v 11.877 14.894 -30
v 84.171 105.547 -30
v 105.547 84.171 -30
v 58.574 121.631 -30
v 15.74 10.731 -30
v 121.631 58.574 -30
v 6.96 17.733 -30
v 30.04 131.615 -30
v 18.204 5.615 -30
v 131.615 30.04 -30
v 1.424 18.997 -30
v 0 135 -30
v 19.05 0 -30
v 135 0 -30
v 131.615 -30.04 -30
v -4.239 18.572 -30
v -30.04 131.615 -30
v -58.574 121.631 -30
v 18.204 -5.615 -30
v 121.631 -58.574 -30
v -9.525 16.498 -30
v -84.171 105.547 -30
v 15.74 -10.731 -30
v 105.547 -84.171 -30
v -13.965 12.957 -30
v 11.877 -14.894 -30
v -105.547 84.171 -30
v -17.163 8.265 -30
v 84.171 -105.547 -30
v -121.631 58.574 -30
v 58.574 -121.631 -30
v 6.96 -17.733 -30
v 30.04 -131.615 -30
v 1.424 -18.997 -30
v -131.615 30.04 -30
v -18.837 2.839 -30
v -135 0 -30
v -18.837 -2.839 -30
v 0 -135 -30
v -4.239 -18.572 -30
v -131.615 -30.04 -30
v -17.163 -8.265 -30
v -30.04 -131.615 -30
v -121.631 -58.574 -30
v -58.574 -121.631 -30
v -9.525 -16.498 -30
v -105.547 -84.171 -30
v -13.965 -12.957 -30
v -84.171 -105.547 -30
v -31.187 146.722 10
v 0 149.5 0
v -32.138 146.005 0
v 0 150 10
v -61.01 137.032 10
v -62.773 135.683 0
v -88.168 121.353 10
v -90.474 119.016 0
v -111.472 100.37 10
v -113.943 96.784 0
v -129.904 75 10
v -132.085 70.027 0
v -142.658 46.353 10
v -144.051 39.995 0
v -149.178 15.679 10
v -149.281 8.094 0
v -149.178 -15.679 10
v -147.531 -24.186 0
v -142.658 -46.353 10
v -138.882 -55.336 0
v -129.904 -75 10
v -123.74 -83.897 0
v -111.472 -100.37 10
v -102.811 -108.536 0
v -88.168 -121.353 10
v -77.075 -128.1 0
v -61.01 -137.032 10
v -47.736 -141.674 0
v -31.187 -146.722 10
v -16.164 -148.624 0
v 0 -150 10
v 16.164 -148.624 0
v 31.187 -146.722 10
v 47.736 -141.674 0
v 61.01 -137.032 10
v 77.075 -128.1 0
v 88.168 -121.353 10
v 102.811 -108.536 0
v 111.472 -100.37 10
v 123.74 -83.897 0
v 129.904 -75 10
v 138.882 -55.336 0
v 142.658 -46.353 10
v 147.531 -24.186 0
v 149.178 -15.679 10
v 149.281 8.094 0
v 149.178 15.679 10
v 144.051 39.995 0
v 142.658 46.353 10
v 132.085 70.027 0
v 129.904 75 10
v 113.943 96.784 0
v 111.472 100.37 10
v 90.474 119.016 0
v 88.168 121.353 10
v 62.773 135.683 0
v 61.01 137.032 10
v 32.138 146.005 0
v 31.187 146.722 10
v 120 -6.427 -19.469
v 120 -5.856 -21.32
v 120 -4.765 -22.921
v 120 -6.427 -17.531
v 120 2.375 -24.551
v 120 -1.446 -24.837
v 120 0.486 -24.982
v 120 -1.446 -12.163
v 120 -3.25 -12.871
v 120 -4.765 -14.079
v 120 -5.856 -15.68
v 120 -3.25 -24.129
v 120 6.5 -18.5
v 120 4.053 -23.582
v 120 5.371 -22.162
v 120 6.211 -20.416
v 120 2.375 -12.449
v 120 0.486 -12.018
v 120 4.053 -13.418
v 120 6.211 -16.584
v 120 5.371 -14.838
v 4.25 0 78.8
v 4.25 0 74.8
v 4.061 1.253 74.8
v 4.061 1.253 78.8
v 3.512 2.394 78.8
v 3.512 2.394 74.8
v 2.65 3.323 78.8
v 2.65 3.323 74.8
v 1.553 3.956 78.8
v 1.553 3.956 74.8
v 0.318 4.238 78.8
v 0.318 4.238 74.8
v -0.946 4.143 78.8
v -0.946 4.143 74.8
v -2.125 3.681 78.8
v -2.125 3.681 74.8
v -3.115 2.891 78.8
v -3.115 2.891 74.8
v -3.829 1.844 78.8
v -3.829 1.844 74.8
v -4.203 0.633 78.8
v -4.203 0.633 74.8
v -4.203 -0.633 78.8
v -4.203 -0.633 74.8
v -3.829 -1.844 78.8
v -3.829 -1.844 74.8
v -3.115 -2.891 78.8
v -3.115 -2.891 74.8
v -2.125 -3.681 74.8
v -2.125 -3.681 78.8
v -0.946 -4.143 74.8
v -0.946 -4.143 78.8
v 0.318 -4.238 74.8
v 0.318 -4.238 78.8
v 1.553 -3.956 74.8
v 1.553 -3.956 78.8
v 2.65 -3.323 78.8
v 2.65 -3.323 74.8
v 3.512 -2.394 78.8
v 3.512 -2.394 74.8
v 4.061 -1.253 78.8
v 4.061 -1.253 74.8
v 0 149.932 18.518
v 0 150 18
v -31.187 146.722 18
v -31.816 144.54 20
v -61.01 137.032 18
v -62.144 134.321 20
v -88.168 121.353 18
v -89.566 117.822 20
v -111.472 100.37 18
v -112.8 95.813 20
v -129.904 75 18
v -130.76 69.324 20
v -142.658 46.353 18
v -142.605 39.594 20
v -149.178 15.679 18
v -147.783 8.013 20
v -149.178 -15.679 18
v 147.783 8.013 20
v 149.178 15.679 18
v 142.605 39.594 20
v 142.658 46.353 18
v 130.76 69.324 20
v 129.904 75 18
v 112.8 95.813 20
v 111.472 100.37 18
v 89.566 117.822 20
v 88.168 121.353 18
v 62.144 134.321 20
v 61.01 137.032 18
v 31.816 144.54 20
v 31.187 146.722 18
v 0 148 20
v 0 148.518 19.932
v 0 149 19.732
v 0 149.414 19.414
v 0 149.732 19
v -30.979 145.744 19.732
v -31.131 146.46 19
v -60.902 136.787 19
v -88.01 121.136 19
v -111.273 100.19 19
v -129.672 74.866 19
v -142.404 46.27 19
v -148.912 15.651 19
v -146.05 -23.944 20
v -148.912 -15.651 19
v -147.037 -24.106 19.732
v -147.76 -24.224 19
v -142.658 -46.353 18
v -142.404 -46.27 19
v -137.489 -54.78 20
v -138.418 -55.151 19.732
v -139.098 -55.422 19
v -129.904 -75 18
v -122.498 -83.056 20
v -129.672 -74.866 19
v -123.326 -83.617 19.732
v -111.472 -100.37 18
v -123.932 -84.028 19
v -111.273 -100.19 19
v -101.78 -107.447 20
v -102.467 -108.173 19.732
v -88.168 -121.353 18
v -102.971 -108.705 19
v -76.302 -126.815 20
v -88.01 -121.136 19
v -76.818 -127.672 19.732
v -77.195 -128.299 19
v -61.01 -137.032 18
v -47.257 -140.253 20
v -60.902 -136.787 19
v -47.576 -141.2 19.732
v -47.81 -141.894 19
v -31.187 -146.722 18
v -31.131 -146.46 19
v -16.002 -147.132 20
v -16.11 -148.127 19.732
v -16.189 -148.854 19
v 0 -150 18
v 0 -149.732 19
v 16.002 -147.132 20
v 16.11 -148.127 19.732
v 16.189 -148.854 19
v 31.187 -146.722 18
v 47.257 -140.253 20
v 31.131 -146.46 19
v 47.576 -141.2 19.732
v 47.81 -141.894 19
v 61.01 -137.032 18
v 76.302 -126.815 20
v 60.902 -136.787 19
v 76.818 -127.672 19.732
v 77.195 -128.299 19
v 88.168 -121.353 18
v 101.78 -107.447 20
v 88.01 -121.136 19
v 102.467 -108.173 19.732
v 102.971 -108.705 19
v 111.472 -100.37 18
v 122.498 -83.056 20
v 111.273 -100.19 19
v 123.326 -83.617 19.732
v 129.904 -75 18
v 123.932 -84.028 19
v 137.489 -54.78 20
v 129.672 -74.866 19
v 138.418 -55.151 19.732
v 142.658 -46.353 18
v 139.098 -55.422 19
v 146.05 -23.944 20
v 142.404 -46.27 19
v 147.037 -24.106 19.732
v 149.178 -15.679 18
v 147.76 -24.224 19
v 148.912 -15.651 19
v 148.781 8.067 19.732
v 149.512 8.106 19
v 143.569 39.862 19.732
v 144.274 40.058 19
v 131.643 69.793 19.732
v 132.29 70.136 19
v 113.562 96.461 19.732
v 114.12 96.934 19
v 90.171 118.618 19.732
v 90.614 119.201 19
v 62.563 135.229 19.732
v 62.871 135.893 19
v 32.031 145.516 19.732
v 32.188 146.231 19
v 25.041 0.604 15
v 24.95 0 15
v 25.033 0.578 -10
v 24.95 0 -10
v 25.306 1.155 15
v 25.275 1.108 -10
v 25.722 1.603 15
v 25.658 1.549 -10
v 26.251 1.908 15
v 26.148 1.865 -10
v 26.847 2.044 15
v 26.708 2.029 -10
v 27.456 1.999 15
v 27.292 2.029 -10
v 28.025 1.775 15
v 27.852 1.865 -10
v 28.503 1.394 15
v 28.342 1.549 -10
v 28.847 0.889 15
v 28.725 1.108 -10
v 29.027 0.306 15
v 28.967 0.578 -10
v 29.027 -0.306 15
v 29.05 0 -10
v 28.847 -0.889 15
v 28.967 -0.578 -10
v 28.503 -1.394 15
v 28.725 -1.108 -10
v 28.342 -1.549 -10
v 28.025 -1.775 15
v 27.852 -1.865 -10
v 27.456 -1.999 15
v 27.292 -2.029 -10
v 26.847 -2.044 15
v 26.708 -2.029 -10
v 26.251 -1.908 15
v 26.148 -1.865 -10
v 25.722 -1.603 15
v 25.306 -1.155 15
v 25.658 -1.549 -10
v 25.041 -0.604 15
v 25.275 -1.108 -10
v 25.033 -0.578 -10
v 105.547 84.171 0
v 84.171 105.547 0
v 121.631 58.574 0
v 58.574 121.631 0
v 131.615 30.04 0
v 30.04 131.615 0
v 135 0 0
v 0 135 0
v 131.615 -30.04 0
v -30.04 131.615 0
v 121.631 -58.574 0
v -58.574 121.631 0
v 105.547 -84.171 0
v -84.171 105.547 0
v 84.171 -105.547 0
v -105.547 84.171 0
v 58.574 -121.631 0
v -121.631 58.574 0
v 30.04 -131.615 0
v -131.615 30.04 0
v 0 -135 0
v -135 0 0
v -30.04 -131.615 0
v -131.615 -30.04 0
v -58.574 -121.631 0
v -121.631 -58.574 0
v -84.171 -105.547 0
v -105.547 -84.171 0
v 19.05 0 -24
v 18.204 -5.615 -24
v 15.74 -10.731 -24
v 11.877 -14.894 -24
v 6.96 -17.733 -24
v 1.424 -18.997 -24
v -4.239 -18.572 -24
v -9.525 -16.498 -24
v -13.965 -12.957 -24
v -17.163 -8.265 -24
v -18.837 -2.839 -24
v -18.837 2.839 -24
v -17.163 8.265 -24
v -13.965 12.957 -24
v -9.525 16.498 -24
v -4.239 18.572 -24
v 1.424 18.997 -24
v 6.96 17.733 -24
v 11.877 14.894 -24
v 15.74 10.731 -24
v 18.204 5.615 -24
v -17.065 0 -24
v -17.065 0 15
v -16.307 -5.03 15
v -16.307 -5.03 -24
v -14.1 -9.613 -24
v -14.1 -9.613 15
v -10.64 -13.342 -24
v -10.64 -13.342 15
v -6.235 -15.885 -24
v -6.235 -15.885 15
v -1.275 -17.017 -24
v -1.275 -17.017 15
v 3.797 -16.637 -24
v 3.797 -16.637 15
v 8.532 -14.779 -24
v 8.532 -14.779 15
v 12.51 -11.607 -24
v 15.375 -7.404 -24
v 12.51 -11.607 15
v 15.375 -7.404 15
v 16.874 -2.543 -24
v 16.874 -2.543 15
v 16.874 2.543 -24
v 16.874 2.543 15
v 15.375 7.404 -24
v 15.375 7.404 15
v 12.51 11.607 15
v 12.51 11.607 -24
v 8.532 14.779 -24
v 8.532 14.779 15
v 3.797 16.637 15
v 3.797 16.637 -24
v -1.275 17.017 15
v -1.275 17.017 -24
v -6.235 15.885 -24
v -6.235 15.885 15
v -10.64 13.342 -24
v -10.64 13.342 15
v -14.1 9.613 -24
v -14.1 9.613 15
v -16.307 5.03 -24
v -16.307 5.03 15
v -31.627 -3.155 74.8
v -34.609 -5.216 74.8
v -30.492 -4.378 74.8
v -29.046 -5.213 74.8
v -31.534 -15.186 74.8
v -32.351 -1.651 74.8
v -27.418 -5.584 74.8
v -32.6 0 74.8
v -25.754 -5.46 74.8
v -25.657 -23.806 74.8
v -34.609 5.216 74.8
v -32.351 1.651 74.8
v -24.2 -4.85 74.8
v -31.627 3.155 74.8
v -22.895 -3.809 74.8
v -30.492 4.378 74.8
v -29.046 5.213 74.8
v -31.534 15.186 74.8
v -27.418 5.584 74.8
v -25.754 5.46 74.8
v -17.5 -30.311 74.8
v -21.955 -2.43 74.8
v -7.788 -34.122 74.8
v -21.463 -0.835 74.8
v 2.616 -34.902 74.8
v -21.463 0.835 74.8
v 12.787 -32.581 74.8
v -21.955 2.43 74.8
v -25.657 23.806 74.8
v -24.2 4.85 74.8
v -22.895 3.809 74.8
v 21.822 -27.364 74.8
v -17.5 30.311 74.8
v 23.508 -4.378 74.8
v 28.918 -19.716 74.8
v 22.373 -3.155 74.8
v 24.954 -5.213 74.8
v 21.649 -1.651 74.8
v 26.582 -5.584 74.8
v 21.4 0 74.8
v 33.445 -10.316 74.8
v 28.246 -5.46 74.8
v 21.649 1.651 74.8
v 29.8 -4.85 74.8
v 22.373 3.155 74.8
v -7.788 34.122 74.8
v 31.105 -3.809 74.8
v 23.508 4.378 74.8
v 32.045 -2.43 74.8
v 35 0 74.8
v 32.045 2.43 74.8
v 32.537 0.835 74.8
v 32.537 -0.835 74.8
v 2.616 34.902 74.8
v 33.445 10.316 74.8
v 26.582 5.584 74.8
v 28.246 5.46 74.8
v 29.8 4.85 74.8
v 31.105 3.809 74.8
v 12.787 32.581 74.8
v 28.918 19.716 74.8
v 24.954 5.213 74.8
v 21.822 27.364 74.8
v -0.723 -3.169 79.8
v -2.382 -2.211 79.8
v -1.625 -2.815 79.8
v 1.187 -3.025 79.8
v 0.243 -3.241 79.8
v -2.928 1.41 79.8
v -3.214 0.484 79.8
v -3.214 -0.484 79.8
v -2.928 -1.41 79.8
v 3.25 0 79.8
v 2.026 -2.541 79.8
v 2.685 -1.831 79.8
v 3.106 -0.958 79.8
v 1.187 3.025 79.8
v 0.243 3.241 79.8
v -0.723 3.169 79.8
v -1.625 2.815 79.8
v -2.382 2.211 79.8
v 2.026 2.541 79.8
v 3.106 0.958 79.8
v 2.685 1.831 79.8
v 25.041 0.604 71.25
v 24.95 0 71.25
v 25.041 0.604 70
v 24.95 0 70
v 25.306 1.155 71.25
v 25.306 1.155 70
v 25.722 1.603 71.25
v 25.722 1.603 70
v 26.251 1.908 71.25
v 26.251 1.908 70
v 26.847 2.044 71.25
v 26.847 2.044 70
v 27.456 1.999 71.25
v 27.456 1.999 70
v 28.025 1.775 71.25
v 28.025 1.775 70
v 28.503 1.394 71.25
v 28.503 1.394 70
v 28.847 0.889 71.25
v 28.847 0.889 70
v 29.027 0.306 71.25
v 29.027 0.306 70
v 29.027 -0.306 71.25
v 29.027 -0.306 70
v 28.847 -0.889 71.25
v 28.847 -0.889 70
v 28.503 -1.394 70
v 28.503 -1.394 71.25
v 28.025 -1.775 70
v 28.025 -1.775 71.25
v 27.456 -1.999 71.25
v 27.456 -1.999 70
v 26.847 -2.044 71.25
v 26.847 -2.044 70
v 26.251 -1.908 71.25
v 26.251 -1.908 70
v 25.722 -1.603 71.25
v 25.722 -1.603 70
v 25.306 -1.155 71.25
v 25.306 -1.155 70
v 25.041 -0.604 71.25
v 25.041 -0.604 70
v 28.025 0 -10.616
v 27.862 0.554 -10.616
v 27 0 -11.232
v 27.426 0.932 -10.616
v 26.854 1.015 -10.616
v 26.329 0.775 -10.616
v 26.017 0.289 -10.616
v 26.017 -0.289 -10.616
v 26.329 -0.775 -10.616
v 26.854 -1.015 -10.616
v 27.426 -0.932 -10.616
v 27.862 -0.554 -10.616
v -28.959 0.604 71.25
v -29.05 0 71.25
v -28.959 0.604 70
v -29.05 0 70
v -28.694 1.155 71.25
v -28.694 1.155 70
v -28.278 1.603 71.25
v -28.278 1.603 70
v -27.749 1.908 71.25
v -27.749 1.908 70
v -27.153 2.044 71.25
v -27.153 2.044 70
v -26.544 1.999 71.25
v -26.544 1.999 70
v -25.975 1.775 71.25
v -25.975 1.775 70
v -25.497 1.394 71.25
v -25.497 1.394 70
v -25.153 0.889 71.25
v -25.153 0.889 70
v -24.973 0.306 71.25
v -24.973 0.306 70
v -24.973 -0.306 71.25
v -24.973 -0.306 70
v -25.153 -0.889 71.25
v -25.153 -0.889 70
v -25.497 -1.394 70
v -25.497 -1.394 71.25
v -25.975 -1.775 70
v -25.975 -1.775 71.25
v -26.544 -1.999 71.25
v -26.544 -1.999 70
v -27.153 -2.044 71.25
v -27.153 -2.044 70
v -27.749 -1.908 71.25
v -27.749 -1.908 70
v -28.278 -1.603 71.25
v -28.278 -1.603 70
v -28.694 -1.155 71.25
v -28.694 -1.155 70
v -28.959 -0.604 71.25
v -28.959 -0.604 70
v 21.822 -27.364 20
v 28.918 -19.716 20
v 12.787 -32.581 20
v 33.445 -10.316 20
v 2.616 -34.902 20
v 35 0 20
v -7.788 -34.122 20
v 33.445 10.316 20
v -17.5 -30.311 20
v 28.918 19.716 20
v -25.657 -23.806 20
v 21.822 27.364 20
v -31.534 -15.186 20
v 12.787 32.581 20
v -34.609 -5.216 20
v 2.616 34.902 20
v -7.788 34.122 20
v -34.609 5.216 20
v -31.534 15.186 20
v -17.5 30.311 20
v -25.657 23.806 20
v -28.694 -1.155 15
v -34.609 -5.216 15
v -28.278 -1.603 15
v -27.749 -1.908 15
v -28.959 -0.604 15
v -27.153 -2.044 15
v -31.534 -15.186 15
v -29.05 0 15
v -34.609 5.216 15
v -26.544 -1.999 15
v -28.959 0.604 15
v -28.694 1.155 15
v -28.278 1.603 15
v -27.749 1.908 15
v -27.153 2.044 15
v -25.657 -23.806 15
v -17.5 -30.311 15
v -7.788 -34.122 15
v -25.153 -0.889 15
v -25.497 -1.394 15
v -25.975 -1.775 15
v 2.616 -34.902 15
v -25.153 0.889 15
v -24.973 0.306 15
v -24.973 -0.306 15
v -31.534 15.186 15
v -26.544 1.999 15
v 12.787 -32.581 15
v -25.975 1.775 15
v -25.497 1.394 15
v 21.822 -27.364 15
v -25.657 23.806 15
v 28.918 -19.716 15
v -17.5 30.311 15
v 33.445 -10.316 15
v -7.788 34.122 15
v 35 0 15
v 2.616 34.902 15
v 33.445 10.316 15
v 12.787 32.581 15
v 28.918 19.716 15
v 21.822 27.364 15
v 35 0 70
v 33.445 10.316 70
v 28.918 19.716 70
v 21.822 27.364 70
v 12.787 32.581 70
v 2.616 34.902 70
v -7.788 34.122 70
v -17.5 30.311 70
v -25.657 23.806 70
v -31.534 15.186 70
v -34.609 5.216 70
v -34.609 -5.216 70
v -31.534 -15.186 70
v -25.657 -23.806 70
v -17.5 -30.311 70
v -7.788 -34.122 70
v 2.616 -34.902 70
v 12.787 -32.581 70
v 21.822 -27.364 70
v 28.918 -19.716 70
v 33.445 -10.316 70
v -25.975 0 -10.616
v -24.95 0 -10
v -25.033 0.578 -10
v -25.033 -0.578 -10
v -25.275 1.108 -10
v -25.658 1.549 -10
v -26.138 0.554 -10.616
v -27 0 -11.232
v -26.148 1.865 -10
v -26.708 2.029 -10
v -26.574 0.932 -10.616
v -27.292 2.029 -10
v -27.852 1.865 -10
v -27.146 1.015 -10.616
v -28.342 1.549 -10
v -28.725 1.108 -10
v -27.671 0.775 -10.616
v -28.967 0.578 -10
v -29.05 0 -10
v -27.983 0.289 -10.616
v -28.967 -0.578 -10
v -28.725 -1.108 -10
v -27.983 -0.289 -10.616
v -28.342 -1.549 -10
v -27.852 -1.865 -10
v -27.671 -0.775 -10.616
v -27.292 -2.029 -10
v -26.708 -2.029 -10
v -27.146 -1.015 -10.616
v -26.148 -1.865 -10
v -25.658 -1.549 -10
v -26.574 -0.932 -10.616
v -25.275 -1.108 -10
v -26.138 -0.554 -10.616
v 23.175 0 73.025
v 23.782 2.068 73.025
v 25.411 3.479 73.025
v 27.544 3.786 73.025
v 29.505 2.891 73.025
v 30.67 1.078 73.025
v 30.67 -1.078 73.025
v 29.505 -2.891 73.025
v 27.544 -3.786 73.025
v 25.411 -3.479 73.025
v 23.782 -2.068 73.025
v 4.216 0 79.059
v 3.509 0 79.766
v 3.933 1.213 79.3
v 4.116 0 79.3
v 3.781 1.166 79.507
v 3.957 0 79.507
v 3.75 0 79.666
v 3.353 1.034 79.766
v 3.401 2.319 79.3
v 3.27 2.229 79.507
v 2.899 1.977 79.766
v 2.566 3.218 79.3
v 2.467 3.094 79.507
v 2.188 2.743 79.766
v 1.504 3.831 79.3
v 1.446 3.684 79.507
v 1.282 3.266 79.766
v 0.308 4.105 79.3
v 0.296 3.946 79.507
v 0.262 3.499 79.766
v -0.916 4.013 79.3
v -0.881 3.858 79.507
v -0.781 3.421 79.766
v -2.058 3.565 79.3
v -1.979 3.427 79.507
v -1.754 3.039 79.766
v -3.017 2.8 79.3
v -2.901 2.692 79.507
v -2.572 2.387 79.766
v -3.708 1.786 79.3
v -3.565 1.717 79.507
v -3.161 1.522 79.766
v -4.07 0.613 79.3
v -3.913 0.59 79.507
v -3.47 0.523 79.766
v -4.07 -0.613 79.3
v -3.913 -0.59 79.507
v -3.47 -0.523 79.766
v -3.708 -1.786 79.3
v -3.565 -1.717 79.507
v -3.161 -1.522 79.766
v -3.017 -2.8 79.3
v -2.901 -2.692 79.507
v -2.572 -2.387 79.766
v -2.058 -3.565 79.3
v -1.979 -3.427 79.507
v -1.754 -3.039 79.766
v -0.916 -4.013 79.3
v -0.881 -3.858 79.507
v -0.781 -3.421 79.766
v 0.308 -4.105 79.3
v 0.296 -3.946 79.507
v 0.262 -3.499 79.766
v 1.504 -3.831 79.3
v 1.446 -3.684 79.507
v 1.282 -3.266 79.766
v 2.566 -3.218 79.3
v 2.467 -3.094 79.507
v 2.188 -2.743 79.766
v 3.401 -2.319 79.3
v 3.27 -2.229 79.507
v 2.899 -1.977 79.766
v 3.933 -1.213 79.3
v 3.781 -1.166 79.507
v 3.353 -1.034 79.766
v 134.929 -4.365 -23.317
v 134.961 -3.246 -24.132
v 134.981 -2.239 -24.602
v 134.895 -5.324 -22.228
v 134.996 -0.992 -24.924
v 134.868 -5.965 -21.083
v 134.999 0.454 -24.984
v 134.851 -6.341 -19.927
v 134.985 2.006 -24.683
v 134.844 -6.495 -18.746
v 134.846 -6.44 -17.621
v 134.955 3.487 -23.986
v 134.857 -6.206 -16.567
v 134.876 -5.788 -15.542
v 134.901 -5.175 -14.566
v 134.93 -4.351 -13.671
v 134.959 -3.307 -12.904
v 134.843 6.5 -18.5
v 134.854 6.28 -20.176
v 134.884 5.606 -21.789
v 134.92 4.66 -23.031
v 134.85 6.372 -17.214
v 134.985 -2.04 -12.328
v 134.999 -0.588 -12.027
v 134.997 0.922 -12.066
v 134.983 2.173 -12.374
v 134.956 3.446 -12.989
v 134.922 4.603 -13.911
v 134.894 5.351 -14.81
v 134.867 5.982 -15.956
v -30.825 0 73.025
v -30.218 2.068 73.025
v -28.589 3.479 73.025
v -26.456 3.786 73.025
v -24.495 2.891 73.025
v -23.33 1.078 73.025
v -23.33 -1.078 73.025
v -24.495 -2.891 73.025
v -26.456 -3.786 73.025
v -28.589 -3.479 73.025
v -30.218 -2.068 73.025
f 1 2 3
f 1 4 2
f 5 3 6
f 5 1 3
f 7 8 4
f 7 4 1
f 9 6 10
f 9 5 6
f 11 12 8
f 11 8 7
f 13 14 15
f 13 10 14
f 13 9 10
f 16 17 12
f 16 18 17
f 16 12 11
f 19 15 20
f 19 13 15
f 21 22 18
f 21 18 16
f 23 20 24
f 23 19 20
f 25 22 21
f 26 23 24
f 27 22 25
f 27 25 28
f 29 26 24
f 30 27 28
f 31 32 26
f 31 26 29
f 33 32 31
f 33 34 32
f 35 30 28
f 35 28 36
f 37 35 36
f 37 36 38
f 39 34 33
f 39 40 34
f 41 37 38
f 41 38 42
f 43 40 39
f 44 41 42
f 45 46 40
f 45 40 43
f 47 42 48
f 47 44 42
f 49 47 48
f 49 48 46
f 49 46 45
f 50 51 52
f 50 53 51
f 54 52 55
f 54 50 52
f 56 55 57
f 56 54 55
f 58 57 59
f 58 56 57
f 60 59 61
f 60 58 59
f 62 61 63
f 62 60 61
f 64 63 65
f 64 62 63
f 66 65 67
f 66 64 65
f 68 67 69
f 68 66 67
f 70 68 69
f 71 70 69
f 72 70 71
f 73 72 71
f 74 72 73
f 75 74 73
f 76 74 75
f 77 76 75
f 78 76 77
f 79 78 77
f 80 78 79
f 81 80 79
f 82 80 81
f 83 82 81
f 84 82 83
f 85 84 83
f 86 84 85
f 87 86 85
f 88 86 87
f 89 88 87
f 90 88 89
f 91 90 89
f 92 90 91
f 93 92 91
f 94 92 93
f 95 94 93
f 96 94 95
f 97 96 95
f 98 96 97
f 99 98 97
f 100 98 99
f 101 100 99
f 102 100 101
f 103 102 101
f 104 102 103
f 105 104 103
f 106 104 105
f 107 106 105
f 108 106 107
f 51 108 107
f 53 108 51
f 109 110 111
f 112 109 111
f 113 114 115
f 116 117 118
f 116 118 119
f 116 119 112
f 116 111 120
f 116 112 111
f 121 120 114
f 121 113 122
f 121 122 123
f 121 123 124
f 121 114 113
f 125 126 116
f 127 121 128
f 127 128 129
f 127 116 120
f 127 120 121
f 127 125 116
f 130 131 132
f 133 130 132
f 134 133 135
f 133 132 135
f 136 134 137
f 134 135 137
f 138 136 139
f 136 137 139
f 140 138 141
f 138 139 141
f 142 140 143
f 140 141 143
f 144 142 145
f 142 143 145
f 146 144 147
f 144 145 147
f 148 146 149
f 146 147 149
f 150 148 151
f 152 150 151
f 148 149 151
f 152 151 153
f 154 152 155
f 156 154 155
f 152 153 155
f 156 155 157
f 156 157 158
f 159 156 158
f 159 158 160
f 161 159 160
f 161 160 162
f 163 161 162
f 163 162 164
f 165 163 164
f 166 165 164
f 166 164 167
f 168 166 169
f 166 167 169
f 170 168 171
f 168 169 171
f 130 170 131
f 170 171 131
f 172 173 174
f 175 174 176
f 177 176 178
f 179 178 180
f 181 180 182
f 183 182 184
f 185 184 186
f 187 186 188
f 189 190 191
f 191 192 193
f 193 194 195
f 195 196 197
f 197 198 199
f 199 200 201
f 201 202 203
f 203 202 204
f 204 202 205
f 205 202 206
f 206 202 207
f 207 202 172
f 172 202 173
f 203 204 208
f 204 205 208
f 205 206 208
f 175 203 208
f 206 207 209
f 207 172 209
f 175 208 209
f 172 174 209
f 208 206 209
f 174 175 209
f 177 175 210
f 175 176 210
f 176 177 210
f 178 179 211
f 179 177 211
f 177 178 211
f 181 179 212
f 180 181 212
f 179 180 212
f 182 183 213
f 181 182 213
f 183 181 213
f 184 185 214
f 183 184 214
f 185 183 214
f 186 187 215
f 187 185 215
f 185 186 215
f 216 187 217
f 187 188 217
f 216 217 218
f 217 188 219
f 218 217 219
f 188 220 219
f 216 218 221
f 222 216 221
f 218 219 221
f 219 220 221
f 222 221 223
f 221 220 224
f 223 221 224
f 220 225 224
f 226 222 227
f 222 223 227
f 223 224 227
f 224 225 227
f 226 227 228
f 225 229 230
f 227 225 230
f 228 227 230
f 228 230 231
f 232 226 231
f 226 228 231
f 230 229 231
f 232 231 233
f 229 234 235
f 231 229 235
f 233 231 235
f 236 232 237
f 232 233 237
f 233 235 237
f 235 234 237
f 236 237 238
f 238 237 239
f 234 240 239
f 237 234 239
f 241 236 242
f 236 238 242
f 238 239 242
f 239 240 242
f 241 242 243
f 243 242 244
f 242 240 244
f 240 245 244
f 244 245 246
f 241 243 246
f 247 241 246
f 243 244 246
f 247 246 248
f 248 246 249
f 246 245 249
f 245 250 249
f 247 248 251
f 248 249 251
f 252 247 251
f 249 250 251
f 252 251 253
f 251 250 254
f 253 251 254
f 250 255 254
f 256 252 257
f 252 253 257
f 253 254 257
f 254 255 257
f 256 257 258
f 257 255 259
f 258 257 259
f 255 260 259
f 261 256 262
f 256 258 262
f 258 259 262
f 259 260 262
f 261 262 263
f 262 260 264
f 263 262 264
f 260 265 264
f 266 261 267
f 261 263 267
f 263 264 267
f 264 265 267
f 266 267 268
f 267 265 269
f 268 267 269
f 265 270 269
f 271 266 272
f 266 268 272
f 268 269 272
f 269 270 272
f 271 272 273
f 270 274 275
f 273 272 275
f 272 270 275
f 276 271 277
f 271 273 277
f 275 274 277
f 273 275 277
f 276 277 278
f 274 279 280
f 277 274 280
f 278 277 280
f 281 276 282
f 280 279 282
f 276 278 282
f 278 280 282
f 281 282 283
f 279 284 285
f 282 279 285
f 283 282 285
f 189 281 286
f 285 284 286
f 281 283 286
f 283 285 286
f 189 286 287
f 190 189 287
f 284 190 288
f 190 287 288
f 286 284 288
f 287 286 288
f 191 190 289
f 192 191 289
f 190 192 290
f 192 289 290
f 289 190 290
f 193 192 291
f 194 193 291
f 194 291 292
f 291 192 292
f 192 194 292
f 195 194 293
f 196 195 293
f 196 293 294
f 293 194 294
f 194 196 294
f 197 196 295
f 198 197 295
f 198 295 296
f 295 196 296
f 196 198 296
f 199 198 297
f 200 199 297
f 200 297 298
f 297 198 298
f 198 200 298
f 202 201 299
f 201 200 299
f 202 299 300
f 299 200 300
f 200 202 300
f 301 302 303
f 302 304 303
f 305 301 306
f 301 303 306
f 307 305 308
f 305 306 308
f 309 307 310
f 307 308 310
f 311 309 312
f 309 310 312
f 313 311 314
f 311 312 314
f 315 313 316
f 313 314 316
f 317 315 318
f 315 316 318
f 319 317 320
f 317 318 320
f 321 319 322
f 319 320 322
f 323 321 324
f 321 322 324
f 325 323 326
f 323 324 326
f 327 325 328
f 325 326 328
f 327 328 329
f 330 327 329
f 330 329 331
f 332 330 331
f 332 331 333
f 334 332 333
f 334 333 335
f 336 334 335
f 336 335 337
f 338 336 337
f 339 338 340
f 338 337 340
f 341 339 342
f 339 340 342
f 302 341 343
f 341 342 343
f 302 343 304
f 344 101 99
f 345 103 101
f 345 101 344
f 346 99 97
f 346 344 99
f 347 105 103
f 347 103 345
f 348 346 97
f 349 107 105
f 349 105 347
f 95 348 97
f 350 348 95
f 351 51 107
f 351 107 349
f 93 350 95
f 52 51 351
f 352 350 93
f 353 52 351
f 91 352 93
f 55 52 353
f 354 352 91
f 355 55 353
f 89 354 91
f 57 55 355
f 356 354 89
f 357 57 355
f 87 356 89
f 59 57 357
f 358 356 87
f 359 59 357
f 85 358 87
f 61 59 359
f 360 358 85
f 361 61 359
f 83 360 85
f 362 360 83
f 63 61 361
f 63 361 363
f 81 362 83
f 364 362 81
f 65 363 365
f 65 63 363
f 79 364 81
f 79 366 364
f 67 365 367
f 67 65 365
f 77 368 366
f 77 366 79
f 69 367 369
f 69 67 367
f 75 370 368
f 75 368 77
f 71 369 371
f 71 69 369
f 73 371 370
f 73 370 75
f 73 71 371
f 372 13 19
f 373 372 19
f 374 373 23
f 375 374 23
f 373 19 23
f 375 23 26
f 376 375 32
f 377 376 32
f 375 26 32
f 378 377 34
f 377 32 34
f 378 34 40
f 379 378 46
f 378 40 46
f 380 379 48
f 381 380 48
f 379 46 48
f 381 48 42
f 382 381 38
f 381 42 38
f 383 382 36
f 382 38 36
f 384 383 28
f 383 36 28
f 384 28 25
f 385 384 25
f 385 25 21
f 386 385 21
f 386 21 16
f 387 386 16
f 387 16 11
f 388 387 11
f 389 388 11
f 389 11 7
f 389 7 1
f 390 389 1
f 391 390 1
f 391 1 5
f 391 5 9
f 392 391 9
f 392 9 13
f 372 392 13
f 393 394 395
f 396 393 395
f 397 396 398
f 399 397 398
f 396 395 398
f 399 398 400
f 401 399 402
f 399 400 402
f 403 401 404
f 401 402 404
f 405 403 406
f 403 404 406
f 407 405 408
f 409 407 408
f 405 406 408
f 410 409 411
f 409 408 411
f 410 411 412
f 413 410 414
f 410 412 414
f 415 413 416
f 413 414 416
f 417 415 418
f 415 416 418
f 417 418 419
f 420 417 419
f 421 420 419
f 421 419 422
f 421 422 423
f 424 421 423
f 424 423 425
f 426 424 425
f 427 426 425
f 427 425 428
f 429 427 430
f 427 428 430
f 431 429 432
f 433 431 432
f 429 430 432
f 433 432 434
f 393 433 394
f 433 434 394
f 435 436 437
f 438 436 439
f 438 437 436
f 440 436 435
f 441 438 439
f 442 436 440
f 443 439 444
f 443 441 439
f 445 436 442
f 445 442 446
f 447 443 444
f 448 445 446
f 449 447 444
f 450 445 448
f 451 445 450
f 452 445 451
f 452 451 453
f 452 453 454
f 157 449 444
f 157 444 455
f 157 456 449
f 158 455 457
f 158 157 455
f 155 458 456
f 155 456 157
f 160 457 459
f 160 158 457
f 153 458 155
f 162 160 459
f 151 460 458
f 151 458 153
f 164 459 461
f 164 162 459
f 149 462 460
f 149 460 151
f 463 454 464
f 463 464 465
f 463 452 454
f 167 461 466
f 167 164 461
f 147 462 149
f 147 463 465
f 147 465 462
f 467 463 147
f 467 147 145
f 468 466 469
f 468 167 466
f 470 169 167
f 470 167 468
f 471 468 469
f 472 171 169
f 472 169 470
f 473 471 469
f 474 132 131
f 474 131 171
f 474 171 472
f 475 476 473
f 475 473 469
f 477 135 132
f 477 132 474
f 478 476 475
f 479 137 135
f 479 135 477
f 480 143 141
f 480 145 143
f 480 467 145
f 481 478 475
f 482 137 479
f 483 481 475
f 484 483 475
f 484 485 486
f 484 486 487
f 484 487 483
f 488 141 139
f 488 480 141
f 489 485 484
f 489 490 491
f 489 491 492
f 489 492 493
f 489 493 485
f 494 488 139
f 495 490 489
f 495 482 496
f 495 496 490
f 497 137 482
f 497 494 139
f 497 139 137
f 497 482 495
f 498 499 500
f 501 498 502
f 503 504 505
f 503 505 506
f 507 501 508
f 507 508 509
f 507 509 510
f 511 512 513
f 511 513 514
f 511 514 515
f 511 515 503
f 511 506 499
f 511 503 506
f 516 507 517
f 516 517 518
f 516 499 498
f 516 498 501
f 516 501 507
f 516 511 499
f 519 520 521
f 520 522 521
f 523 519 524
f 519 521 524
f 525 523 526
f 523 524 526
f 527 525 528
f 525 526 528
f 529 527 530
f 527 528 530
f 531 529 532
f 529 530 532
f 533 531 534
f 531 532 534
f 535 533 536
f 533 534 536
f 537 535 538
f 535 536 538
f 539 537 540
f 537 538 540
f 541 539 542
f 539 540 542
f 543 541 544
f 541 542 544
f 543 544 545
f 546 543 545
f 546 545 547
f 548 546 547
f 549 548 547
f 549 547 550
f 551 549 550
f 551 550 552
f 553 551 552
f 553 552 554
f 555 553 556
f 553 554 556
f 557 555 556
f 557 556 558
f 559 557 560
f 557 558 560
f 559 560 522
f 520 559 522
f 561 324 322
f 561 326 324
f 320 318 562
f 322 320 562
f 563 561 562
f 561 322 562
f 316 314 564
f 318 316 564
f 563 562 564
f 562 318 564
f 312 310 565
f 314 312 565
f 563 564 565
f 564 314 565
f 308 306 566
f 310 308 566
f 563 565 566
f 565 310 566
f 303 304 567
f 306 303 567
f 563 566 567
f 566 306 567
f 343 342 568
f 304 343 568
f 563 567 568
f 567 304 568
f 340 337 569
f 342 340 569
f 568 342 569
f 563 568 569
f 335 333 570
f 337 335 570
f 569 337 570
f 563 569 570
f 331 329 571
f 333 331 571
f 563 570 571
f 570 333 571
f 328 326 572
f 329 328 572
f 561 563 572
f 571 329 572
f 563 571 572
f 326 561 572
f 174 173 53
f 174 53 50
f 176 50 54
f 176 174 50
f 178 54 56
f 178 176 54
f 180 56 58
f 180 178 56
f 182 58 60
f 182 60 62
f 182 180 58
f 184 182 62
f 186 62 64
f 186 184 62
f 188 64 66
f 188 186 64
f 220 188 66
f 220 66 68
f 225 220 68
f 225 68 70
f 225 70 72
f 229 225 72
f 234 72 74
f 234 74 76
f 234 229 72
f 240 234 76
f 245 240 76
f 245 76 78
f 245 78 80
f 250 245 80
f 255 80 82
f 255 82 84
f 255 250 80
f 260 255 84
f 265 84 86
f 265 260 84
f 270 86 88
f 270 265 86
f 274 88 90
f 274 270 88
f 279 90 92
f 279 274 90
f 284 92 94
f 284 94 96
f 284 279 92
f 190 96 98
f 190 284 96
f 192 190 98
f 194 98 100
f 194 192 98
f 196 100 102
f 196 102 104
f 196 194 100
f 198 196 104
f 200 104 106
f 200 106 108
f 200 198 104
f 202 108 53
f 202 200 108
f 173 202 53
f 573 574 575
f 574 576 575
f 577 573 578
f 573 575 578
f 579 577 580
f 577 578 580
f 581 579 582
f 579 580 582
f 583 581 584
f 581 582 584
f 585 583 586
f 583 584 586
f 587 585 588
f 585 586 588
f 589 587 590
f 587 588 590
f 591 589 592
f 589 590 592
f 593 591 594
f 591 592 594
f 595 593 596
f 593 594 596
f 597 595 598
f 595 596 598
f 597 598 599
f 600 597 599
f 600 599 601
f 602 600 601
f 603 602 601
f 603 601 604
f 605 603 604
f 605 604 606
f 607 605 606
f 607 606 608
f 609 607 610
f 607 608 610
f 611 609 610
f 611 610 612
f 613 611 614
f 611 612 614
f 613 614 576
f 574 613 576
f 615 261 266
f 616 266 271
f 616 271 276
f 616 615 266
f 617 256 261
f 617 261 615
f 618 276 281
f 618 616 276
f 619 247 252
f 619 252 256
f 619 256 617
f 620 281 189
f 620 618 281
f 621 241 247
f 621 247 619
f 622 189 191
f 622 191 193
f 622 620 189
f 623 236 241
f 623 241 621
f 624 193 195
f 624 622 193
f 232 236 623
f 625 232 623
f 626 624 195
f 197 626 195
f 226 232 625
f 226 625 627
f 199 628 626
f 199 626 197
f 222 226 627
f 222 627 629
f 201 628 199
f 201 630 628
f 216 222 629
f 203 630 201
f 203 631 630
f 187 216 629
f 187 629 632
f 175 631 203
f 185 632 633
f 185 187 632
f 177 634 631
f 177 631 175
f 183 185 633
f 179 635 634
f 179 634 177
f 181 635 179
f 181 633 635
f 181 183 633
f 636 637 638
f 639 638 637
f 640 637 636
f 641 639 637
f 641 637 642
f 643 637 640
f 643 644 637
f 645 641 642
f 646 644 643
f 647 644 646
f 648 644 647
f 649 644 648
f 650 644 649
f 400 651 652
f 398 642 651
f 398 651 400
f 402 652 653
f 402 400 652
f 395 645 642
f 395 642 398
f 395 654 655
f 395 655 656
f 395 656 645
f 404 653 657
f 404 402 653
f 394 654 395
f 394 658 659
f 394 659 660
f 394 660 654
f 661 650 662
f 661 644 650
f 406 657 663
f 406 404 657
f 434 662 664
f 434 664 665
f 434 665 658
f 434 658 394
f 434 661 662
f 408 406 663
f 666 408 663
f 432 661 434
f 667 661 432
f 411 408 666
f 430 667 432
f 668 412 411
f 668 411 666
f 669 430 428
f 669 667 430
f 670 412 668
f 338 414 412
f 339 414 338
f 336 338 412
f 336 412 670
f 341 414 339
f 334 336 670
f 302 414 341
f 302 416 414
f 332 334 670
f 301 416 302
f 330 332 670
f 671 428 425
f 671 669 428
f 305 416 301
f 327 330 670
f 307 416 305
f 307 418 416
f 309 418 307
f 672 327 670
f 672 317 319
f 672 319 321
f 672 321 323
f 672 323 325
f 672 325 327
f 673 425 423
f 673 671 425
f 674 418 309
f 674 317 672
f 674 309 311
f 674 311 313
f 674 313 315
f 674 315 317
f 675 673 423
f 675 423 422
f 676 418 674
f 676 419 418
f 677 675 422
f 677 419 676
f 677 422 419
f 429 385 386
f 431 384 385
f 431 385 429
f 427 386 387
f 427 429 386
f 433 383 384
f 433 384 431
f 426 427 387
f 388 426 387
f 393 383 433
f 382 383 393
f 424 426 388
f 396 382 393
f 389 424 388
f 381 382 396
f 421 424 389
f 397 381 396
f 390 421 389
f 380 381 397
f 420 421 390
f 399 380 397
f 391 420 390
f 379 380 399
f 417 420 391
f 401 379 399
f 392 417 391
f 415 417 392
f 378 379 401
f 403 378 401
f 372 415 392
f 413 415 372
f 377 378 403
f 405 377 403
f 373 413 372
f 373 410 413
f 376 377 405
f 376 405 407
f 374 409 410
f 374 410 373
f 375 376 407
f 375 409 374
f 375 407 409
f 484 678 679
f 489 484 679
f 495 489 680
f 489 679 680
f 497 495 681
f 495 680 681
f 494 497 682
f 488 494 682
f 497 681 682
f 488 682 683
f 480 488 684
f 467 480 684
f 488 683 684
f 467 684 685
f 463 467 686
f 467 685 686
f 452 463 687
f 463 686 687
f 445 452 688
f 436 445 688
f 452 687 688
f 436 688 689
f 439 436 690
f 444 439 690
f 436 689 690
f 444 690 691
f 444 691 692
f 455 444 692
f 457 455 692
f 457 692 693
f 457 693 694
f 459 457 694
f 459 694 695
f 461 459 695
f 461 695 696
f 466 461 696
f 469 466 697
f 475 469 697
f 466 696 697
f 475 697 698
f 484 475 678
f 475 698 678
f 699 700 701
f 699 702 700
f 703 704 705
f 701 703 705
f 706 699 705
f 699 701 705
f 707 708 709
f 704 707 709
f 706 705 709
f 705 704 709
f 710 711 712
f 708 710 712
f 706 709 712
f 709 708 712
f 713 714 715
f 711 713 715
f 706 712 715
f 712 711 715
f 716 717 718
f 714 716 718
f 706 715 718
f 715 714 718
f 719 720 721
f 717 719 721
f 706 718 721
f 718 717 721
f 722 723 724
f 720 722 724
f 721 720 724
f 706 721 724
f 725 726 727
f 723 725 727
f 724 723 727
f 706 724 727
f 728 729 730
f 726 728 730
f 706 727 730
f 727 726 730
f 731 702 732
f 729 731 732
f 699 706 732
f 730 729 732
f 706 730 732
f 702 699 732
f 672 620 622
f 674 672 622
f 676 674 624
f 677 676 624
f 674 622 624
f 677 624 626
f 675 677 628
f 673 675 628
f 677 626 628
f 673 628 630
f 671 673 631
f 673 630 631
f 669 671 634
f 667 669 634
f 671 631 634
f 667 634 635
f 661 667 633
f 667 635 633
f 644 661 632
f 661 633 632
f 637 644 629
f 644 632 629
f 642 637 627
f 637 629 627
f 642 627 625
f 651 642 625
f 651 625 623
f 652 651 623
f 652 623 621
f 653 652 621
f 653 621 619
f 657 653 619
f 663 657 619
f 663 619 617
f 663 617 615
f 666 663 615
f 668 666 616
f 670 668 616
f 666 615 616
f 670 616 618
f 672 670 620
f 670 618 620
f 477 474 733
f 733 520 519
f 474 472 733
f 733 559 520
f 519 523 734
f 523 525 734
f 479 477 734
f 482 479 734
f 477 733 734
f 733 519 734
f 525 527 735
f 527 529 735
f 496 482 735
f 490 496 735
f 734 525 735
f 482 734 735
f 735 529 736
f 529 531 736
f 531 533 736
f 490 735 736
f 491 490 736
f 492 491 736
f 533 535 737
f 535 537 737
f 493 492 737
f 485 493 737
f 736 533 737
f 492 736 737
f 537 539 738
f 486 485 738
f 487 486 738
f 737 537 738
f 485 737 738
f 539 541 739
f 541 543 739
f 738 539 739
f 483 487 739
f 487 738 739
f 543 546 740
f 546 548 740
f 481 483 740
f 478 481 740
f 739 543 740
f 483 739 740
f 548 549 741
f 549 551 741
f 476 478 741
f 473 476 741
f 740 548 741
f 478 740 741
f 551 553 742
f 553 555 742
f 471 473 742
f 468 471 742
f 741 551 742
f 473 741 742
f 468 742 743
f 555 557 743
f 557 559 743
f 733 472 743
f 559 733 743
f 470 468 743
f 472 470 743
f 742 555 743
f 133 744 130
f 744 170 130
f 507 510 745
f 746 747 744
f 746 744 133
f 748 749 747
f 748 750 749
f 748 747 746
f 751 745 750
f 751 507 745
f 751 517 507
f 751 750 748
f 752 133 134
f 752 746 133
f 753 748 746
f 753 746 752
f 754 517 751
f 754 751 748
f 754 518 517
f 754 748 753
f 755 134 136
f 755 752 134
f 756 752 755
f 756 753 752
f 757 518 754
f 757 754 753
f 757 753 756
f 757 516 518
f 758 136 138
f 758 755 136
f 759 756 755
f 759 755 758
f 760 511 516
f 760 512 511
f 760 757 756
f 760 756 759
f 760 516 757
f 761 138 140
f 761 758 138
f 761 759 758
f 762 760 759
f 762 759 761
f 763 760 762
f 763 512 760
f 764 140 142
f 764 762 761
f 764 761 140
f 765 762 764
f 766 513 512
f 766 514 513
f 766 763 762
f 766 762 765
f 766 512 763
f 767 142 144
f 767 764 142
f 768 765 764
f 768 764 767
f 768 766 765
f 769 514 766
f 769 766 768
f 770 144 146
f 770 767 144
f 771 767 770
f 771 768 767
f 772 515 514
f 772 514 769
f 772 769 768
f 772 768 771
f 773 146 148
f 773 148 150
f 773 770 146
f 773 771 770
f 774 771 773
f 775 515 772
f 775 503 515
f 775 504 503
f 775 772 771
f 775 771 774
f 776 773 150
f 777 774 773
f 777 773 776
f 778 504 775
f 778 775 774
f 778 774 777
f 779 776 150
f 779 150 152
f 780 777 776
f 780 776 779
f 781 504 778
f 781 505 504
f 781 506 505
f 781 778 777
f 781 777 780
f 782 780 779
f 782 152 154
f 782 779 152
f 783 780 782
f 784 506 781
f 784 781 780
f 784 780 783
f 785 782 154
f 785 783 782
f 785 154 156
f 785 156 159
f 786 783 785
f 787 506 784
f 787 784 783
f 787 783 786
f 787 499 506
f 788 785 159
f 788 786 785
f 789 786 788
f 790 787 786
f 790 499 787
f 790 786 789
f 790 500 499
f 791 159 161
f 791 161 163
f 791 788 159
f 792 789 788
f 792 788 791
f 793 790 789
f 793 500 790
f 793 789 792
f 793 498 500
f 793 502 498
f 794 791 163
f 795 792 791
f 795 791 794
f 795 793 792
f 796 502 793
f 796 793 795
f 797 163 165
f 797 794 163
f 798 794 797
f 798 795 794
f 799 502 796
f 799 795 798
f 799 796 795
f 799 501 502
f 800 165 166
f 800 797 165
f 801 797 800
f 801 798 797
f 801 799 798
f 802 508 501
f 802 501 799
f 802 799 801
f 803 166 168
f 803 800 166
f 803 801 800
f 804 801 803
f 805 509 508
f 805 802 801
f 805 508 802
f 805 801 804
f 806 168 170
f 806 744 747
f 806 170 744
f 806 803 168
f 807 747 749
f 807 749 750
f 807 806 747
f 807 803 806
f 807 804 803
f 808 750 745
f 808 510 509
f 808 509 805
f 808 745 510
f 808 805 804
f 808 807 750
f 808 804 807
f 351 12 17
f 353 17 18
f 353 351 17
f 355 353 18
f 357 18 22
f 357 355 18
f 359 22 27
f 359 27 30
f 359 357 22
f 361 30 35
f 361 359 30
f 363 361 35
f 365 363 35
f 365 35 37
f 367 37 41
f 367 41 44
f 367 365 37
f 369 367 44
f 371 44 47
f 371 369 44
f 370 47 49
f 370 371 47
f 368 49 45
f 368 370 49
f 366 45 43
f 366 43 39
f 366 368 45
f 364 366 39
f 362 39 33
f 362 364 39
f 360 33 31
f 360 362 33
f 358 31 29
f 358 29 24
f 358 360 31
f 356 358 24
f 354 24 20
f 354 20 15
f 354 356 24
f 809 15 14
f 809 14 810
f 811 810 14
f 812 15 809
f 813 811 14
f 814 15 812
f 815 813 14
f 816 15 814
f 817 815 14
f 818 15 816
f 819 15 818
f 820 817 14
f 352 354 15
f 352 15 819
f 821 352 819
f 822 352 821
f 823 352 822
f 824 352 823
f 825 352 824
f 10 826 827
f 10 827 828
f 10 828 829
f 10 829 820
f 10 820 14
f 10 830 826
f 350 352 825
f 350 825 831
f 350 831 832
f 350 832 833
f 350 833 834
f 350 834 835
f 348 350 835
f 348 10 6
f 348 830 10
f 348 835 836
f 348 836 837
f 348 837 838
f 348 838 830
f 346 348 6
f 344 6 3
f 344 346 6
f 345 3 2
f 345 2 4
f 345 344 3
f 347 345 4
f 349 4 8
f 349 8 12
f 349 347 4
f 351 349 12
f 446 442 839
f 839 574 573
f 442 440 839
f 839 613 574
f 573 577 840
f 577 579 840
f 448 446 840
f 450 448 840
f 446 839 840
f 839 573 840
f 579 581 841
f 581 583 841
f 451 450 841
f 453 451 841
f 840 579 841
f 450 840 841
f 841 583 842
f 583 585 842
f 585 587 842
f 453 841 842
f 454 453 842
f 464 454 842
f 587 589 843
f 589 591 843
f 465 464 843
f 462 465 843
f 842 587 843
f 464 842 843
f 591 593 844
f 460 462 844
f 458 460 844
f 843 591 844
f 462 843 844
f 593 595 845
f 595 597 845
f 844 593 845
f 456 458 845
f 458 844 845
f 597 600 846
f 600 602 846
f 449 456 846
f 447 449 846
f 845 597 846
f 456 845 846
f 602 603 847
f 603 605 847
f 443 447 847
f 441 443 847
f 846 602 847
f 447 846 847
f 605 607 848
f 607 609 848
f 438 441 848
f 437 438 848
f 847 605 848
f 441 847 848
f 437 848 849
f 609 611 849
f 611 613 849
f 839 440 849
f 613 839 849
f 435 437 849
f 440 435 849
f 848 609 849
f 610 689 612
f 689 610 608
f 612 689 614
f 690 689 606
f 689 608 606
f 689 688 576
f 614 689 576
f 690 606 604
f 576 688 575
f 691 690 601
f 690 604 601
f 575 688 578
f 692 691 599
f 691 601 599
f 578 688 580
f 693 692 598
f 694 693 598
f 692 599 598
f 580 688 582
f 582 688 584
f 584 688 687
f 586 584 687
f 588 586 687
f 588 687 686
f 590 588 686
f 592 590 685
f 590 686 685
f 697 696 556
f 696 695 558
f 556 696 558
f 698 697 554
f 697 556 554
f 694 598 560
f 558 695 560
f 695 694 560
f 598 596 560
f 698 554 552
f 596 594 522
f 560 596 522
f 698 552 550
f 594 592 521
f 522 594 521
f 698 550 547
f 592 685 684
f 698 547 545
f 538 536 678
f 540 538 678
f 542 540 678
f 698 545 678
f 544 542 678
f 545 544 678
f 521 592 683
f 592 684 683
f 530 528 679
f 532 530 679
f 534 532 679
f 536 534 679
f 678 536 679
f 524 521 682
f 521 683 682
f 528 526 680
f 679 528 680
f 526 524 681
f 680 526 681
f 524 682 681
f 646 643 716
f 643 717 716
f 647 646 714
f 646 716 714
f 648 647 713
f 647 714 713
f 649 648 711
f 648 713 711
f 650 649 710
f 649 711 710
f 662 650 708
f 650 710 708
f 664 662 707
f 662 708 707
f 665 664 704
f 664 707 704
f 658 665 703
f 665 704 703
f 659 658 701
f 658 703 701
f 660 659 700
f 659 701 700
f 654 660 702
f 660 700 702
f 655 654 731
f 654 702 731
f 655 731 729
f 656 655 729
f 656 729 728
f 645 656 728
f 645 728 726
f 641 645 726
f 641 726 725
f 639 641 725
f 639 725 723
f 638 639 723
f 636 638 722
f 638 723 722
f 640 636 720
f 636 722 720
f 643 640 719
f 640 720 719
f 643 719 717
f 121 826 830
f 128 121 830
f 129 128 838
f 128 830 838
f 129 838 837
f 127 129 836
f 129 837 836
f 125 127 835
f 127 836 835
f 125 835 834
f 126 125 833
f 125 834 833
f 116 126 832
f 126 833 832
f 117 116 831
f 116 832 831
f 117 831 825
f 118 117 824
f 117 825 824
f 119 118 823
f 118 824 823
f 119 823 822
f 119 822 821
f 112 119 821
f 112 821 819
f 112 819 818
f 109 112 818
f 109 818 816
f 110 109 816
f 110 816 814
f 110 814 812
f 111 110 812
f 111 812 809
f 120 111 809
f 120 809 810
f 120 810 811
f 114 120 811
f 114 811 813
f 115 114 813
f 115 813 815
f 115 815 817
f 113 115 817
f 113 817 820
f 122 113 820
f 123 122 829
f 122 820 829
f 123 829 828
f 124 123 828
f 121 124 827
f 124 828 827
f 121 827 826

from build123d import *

# Parameters (mm, degrees)
F3_D            = 34.12998
F3_CBORE_D      = 38.1
F3_CBORE_DEPTH  = 6
F6_R            = 6.5
F7_DEPTH        = 15
F8_R            = 2
F10_R           = 35
F11_DEPTH       = 5
F13_R           = 35
F14_DEPTH       = 4.8
F15_R           = 4.25
F16_DEPTH       = 5
F19_D           = 4.1
F19_DEPTH       = 25
F19_CSINK_D     = 11.2
F19_CSINK_ANGLE = 90
F19_TIP         = 1.231764269
F20_D           = 4.1
F20_DEPTH       = 25
F20_TIP         = 1.231764269
F21_R           = 1


with BuildPart() as f1:
    # F0 (on Right) → F1 (revolve)
    with BuildSketch(Plane.YZ):
        Polygon((150, 20), (0, 20), (0, -30), (135, -30), (135, 0), (149.5, 0), (150, 10), align=None)
    revolve(axis=Axis((0, 0, -5), (0, 0, 1)))

    # F3 (through all)
    with Locations(Plane(origin=(0, 0, -30), x_dir=(1, 0, 0), z_dir=(0, 0, -1))):
        with Locations((0, 0)):
            CounterBoreHole(F3_D / 2, F3_CBORE_D / 2, F3_CBORE_DEPTH)

    # F6 (on line) → F7 (cut)
    with BuildSketch(Plane.YZ.offset(135)):
        with Locations((0, -18.5)):
            Circle(F6_R)
    extrude(amount=-F7_DEPTH, mode=Mode.SUBTRACT)

    # F8
    f8_edges = [f1.edges().sort_by_distance(p)[0] for p in [
        (0, -150, 20),
    ]]
    fillet(f8_edges, radius=F8_R)

    # F10 (on offset) → F11 (cut)
    with BuildSketch(Plane.XY.offset(20)):
        Circle(F10_R)
    extrude(amount=-F11_DEPTH, mode=Mode.SUBTRACT)

    # F20
    with Locations(Plane.XY.offset(15)):
        with Locations((-27, 0), (27, 0)):
            Hole(F20_D / 2, depth=F20_DEPTH)
            with Locations((0, 0, -(F20_DEPTH + F20_TIP / 2))):  # 118° drill point
                Cone(0, F20_D / 2, F20_TIP, mode=Mode.SUBTRACT)


with BuildPart() as f14:
    # F13 (on offset) → F14 (new body)
    with BuildSketch(Plane.XY.offset(70)):
        Circle(F13_R)
    extrude(amount=F14_DEPTH)

    # F15 (on face) → F16 (join)
    with BuildSketch(Plane.XY.offset(74.8)):
        Circle(F15_R)
    extrude(amount=F16_DEPTH)

    # F19
    with Locations(Plane.XY.offset(74.8)):
        with Locations((-27, 0), (27, 0)):
            CounterSinkHole(F19_D / 2, F19_CSINK_D / 2, depth=F19_DEPTH, counter_sink_angle=F19_CSINK_ANGLE)
            with Locations((0, 0, -(F19_DEPTH + F19_TIP / 2))):  # 118° drill point
                Cone(0, F19_D / 2, F19_TIP, mode=Mode.SUBTRACT)

    # F21
    f21_edges = [f14.edges().sort_by_distance(p)[0] for p in [
        (-4.25, 0, 79.8),
    ]]
    fillet(f21_edges, radius=F21_R)


solid = Compound([f1.part, f14.part])
